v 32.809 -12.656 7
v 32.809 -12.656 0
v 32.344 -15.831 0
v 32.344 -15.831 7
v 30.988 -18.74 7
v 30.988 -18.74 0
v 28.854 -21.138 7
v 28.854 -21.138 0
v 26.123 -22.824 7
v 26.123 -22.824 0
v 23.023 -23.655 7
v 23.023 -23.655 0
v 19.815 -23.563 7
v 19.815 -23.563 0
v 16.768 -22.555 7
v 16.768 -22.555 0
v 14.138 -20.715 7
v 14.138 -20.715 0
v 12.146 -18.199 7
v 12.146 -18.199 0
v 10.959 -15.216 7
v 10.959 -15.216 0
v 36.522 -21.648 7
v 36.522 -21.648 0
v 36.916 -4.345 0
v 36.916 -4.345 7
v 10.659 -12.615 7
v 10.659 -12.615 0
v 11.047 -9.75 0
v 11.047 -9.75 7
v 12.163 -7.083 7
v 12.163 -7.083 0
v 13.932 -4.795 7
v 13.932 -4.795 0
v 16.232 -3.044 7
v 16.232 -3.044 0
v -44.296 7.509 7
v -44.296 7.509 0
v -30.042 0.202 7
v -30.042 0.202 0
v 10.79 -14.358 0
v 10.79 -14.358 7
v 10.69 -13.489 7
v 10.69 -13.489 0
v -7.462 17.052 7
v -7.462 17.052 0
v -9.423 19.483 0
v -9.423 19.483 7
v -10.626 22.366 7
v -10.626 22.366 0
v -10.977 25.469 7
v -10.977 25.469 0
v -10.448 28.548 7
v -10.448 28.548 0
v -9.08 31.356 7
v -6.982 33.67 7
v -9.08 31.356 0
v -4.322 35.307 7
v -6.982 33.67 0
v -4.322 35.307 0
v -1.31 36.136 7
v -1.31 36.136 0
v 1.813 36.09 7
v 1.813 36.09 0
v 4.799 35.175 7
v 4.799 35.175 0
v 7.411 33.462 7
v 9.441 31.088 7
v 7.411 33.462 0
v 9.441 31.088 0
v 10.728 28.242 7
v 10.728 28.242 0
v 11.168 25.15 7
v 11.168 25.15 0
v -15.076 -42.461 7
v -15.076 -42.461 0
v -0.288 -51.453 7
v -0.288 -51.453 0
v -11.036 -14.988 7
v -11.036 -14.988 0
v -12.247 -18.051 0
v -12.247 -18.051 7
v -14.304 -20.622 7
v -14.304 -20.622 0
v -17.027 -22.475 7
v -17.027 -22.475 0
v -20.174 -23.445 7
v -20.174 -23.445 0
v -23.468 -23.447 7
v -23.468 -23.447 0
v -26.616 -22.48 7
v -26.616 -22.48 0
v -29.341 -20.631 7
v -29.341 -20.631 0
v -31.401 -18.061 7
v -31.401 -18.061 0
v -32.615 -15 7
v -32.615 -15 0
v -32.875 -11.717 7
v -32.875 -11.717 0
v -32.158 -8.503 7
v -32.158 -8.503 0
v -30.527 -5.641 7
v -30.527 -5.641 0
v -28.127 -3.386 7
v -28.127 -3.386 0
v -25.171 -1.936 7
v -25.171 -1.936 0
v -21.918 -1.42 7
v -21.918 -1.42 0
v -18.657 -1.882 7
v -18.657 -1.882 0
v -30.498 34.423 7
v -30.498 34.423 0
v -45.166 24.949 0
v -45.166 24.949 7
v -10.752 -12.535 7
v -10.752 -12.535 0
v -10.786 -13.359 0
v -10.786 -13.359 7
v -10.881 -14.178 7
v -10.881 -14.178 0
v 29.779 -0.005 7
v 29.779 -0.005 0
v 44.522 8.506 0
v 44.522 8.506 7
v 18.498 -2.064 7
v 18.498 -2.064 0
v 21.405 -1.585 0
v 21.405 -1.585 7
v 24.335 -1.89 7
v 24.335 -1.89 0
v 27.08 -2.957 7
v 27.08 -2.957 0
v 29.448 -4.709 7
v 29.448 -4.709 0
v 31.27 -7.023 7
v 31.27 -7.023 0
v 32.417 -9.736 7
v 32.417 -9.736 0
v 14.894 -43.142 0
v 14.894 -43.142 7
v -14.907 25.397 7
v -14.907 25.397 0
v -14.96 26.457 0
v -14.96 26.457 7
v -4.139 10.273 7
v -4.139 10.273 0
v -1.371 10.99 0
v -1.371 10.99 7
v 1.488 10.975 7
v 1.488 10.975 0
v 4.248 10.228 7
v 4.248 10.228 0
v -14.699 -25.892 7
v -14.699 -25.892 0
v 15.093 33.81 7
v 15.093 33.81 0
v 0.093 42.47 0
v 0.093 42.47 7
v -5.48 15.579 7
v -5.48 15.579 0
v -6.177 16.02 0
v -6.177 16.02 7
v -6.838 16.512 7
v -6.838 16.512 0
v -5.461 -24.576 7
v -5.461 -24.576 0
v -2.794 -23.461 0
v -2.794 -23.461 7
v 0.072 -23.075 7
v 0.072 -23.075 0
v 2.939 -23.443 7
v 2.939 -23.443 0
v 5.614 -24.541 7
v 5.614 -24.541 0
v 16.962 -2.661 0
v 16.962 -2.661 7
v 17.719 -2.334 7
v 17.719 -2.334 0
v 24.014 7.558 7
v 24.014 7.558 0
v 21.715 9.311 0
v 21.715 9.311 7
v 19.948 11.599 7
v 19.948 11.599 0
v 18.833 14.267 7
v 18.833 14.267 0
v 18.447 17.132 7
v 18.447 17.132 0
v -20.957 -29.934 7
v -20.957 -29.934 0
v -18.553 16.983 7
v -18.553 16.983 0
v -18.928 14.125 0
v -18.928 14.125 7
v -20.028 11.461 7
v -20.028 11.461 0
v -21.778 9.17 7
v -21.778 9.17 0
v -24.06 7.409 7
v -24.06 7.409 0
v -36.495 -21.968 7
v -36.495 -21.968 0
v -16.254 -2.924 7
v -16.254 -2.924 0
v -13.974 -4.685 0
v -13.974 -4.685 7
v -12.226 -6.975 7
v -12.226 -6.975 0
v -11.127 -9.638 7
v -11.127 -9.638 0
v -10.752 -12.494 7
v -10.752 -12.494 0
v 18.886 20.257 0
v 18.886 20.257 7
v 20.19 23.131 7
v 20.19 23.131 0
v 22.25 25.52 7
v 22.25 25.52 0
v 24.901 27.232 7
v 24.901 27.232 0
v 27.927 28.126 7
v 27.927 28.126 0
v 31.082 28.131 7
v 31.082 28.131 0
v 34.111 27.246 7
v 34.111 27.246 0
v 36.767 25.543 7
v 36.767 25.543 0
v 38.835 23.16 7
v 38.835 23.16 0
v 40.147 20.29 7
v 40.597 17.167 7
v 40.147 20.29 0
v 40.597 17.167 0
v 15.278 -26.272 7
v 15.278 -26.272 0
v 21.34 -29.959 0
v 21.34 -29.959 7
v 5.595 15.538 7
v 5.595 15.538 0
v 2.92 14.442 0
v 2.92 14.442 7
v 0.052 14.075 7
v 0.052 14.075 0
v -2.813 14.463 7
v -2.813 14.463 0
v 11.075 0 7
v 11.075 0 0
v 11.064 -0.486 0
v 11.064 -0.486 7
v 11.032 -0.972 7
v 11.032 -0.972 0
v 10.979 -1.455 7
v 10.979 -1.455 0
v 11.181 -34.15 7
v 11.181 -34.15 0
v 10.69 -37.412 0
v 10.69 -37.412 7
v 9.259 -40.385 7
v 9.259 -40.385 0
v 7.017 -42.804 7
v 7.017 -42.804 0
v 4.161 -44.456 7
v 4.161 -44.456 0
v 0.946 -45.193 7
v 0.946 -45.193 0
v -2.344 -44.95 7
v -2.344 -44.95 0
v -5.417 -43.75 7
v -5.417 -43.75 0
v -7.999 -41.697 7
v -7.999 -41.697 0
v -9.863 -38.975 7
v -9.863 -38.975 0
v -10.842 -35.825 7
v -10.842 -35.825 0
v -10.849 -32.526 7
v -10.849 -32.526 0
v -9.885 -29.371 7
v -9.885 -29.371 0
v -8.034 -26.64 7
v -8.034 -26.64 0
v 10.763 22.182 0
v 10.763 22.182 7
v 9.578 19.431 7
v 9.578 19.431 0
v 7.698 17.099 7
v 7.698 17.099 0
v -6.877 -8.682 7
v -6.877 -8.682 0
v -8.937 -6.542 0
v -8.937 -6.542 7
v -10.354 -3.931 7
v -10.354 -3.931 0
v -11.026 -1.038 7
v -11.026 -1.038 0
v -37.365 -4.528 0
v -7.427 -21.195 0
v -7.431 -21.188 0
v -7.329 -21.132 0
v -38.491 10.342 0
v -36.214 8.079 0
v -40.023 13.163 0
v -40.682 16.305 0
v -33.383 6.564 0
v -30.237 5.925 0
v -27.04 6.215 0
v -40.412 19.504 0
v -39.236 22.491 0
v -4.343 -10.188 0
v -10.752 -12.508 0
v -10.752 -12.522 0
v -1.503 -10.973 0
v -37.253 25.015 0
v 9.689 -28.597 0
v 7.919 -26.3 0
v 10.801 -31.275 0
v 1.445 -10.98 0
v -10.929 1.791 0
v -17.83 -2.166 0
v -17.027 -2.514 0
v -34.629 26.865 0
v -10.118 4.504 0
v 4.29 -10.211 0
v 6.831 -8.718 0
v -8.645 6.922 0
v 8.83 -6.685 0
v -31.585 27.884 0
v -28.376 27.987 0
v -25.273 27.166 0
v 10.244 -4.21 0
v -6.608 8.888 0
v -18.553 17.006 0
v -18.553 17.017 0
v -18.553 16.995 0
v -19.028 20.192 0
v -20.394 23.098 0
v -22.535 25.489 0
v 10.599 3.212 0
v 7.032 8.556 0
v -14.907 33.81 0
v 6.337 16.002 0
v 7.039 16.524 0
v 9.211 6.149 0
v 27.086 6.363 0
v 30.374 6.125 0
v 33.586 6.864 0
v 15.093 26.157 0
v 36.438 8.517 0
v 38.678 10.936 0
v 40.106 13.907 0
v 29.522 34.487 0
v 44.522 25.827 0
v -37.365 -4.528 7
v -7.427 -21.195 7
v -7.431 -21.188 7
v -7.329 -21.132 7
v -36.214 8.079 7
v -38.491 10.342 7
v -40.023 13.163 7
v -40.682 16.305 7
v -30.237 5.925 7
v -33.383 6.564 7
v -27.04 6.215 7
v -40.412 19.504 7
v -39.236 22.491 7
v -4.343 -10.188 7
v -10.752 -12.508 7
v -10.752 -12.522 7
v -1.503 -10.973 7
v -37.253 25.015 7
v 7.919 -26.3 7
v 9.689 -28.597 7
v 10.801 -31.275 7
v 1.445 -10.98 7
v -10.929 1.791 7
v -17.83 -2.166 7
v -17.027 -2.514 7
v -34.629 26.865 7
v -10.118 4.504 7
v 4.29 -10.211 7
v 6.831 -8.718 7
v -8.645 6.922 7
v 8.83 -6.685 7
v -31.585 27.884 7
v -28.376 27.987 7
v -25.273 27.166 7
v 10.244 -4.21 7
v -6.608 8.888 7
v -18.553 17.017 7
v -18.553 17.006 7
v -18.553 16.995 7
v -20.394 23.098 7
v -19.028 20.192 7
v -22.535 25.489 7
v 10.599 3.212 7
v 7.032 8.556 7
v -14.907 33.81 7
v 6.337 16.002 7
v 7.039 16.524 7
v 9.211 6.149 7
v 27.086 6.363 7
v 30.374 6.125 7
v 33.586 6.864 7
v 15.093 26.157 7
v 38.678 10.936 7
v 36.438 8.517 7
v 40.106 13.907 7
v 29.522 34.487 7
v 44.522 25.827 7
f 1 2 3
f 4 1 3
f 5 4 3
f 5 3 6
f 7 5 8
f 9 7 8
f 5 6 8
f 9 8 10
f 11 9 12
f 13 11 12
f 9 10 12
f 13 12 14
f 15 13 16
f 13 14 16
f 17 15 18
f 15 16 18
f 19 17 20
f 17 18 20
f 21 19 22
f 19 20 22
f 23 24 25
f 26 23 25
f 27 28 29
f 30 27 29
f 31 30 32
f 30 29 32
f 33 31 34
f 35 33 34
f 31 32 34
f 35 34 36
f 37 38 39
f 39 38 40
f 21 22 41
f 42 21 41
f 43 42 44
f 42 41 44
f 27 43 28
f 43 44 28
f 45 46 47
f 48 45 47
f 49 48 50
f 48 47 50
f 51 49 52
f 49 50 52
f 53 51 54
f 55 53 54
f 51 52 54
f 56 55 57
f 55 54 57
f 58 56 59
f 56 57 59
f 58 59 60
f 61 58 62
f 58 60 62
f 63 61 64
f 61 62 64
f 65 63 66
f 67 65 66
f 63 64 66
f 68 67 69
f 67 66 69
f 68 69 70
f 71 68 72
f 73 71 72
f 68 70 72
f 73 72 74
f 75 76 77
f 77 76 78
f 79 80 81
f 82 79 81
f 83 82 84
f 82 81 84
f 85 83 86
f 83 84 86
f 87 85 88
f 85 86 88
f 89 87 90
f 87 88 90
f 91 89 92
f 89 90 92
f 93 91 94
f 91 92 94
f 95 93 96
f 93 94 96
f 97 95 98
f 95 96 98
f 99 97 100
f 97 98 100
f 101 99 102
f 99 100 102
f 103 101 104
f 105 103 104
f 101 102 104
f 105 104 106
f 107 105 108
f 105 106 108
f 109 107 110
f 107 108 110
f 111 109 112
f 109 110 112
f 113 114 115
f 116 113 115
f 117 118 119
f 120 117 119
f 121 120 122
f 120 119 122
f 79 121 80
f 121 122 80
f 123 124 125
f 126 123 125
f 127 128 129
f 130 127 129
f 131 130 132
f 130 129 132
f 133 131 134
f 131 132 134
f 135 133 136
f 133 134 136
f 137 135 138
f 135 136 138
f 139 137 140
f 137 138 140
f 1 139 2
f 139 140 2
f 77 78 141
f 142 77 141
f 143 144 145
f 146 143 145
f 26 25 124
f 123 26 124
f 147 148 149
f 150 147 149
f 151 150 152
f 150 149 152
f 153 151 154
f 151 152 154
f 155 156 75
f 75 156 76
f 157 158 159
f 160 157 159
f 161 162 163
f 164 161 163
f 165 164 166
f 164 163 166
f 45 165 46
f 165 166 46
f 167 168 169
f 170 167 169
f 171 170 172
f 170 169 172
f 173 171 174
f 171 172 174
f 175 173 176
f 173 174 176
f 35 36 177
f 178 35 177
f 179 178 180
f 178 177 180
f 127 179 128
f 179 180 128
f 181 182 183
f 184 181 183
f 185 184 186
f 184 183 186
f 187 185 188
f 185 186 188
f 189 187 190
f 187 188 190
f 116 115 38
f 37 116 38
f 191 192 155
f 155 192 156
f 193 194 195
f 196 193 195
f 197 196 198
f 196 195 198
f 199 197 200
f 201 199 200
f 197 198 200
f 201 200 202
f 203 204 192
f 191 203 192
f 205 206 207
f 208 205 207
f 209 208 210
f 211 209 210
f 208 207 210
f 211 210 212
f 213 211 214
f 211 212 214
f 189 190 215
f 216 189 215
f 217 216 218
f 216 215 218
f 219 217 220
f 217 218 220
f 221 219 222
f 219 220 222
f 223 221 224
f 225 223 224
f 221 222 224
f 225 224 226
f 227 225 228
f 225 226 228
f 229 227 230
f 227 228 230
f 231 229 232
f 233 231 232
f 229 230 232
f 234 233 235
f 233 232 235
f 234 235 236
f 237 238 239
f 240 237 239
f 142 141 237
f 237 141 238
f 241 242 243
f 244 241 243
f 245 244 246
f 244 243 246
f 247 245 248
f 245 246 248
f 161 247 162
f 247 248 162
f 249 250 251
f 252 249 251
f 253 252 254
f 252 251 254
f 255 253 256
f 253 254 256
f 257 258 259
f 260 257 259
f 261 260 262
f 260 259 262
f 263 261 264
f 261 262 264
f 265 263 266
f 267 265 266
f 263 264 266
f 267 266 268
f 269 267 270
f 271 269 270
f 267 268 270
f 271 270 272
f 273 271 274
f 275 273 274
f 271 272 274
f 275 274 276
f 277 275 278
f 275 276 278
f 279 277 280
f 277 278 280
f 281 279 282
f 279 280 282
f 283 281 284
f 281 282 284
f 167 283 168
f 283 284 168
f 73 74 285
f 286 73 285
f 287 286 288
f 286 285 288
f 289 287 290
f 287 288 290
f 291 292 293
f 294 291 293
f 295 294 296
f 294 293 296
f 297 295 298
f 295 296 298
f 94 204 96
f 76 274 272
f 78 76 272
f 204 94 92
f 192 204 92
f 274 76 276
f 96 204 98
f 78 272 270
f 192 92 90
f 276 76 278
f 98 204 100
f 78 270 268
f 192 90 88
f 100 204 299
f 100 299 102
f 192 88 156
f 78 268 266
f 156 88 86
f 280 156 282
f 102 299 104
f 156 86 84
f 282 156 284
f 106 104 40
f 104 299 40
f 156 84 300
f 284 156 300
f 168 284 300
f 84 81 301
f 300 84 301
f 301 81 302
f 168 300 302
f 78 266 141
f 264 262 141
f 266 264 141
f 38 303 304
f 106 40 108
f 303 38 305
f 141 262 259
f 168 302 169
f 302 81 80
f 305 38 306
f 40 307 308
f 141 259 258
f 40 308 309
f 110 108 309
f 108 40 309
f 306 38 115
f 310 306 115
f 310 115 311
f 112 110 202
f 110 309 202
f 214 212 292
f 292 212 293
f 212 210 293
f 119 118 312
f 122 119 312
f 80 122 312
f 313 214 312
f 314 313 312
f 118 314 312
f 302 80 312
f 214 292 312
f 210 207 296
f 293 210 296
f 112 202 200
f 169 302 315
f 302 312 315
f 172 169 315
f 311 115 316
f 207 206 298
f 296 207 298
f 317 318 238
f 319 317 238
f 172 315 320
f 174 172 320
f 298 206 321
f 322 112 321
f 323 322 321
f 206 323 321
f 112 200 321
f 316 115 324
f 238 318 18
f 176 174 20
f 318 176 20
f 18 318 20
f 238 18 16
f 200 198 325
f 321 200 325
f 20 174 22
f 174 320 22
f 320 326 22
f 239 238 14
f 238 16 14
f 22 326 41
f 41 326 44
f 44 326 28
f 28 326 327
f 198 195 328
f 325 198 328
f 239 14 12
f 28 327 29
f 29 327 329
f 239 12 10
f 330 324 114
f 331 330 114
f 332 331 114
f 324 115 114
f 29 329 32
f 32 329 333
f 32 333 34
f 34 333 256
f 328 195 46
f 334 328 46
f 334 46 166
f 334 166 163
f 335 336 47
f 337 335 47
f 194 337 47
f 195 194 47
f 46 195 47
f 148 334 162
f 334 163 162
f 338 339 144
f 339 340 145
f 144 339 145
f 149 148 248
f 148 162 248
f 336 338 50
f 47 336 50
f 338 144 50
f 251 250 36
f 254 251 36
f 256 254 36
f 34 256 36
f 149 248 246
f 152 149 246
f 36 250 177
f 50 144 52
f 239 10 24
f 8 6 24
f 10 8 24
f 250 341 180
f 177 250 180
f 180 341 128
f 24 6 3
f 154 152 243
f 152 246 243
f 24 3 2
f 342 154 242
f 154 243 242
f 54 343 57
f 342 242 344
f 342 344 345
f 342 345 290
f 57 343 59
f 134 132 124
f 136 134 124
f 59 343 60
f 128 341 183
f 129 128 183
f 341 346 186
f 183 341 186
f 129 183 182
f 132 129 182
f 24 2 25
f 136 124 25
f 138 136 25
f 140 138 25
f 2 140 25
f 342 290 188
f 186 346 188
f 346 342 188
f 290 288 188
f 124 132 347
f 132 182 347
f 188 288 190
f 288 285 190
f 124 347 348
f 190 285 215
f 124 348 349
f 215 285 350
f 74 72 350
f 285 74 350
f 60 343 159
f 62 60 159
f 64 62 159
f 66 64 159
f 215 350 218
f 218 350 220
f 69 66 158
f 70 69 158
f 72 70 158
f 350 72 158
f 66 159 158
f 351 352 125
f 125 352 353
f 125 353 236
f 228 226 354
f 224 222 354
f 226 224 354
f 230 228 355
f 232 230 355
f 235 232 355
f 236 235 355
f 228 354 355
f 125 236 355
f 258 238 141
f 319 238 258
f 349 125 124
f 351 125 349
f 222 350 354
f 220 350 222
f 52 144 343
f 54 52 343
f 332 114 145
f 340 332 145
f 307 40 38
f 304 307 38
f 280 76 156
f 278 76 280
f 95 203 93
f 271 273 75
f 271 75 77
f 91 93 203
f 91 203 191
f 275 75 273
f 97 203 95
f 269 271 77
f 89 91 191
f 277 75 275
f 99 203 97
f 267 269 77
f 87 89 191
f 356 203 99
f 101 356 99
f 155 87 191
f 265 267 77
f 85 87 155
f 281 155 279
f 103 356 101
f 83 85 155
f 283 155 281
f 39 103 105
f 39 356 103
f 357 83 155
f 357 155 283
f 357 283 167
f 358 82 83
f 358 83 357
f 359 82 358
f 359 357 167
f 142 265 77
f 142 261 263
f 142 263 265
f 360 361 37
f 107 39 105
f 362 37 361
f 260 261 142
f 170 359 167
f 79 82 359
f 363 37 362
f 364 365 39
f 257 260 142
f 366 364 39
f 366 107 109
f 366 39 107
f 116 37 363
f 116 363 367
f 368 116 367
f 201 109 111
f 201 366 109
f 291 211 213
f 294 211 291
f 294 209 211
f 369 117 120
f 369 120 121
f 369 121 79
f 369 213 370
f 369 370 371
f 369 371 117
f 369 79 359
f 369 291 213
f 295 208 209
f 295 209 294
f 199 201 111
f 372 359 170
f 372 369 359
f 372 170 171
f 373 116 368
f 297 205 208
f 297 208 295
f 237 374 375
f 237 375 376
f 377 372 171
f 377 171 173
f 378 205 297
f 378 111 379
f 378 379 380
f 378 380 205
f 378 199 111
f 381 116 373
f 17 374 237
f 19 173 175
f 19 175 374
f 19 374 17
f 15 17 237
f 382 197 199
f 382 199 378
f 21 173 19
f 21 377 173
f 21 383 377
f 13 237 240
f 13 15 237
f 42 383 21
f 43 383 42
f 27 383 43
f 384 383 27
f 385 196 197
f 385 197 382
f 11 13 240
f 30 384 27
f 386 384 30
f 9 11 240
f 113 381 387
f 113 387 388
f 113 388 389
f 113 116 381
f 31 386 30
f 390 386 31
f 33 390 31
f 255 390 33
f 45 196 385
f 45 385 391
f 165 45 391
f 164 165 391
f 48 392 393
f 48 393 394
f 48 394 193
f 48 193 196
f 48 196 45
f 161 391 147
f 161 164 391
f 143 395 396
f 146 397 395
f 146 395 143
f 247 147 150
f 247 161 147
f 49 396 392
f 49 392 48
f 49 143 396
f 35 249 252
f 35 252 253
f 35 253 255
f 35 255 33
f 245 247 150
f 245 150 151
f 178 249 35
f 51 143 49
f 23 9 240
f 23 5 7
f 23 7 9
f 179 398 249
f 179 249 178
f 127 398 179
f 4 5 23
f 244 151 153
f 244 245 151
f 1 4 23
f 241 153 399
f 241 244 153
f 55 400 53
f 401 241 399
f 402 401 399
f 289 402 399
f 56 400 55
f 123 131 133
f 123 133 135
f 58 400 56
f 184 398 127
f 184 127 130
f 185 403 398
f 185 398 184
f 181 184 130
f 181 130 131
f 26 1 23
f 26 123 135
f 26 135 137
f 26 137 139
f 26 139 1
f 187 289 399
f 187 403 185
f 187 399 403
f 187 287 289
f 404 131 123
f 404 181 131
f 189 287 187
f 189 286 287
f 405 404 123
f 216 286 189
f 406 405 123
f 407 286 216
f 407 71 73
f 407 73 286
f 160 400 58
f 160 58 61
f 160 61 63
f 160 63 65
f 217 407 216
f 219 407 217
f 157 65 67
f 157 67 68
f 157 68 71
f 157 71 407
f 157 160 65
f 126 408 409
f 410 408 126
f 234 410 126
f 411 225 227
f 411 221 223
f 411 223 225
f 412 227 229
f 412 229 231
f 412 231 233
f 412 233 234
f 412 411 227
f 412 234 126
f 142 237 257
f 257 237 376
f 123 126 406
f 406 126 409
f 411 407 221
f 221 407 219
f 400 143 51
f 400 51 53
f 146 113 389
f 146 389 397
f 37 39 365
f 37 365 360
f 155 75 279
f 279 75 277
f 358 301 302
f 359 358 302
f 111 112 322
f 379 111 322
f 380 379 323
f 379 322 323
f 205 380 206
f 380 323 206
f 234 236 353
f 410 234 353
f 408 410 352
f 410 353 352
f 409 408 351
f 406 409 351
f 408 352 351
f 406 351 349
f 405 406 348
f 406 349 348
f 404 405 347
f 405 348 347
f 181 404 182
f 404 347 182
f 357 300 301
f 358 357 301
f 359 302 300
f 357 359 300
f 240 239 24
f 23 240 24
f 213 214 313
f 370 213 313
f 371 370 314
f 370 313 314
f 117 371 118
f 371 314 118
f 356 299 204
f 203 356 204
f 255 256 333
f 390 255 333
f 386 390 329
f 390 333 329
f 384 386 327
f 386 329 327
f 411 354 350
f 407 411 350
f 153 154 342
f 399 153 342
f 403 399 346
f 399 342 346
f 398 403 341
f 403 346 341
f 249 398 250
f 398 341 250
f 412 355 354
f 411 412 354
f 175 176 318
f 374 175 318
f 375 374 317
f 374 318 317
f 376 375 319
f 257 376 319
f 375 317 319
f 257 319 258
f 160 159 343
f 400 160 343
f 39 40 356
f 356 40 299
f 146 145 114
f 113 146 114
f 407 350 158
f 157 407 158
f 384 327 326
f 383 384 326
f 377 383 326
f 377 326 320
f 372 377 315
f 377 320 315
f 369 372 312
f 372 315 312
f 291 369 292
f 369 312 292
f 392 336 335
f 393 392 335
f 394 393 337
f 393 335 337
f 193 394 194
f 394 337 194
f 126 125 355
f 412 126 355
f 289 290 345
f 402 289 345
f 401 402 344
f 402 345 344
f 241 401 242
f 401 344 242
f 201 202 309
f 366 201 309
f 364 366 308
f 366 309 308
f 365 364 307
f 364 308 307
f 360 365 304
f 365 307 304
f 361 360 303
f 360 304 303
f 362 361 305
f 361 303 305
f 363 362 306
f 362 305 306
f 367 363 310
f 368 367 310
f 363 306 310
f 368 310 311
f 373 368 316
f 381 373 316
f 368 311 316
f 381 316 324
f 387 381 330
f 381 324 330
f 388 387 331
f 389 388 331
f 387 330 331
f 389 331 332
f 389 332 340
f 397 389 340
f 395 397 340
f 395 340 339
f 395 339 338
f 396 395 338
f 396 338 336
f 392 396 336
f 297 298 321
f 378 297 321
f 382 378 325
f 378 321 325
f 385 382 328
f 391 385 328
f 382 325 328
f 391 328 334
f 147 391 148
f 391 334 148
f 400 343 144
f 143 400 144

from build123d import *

# Parameters (mm, degrees)
F1_DEPTH = 7


with BuildPart() as f1:
    # F0 (on Top) → F1 (new body)
    with BuildSketch(Plane.XY):
        with BuildLine():
            Line((-18.5526829578, 17.017490387), (-14.9068294969, 17.0288079719))
            Line((-14.9068294969, 17.0288079719), (-14.9068294969, 25.39699213))
            Line((-14.9068294969, 25.39699213), (-14.9597222584, 26.4567236773))
            Line((-14.9597222584, 26.4567236773), (-30.4980650394, 34.4226977911))
            Line((-30.4980650394, 34.4226977911), (-45.1659723783, 24.949085267))
            Line((-45.1659723783, 24.949085267), (-44.2955369363, 7.5094986291))
            Line((-44.2955369363, 7.5094986291), (-30.0415552646, 0.2019722978))
            Line((-30.0415552646, 0.2019722978), (-22.6974101401, 4.9453609505))
            Line((-22.6974101401, 4.9453609505), (-22.598117295, 4.8944569227))
            Line((-22.598117295, 4.8944569227), (-24.0603829878, 7.4091156347))
            ThreePointArc((-24.0603829878, 7.4091156347), (-39.2360043497, 22.4908111831), (-18.5526829578, 17.017490387))
        make_face()
        with BuildLine():
            Line((-14.0892868164, 9.0171370394), (-14.4490557214, 16.2252775697))
            Line((-14.4490557214, 16.2252775697), (-14.9068294969, 16.4895733822))
            Line((-14.9068294969, 16.4895733822), (-14.9068294969, 17.0288079719))
            Line((-14.9068294969, 17.0288079719), (-18.5526829578, 17.017490387))
            ThreePointArc((-18.5526829578, 17.017490387), (-18.5526429375, 17.0003007908), (-18.5526295974, 16.9831111532))
            ThreePointArc((-18.5526295974, 16.9831111532), (-20.0278149845, 11.4605044861), (-24.0603829878, 7.4091156347))
            Line((-24.0603829878, 7.4091156347), (-22.598117295, 4.8944569227))
            Line((-22.598117295, 4.8944569227), (-21.4130490309, 4.2869131679))
            Line((-21.4130490309, 4.2869131679), (-14.0892868164, 9.0171370394))
        make_face()
        with BuildLine():
            Line((7.5450461038, 12.1316617283), (5.5951009003, 15.538147707))
            ThreePointArc((5.5951009003, 15.538147707), (0.0521421404, 14.074903417), (-5.4798231028, 15.5791760698))
            Line((-5.4798231028, 15.5791760698), (-7.4549538962, 12.1872309982))
            Line((-7.4549538962, 12.1872309982), (-4.1387329274, 10.2726099291))
            ThreePointArc((-4.1387329274, 10.2726099291), (0.0589181779, 11.0748432787), (4.2477961597, 10.2279935855))
            Line((4.2477961597, 10.2279935855), (7.5450461038, 12.1316617283))
        make_face()
        with BuildLine():
            ThreePointArc((7.6983976037, 17.0989799026), (6.6930526008, 16.2561678079), (5.5951009003, 15.538147707))
            Line((5.5951009003, 15.538147707), (7.5450461038, 12.1316617283))
            Line((7.5450461038, 12.1316617283), (14.5216204926, 16.1595888298))
            Line((14.5216204926, 16.1595888298), (14.5216204926, 17.1201607879))
            Line((14.5216204926, 17.1201607879), (7.6983976037, 17.0989799026))
        make_face()
        with BuildLine():
            Line((-7.4549538962, 12.1872309982), (-5.4798231028, 15.5791760698))
            ThreePointArc((-5.4798231028, 15.5791760698), (-6.5120499472, 16.2601318233), (-7.4619270677, 17.0519186964))
            Line((-7.4619270677, 17.0519186964), (-14.4892258089, 17.0301043117))
            Line((-14.4892258089, 17.0301043117), (-14.4490557214, 16.2252775697))
            Line((-14.4490557214, 16.2252775697), (-7.4549538962, 12.1872309982))
        make_face()
        with BuildLine():
            Line((22.0619456845, 4.1530614915), (18.4983583082, -2.0637409464))
            ThreePointArc((18.4983583082, -2.0637409464), (28.3225469356, -3.7536865399), (32.808804195, -12.6556017326))
            ThreePointArc((32.808804195, -12.6556017326), (23.0230169106, -23.6553088003), (10.9589521726, -15.2164978445))
            Line((10.9589521726, -15.2164978445), (7.5625985652, -21.1415551413))
            Line((7.5625985652, -21.1415551413), (15.2877535418, -25.8390431462))
            Line((15.2877535418, -25.8390431462), (15.2778985596, -26.2723747345))
            Line((15.2778985596, -26.2723747345), (21.3402892473, -29.9587742467))
            Line((21.3402892473, -29.9587742467), (36.5220336844, -21.6479819311))
            Line((36.5220336844, -21.6479819311), (36.915548632, -4.344809417))
            Line((36.915548632, -4.344809417), (29.7789547231, -0.0052117798))
            Line((29.7789547231, -0.0052117798), (29.5216204926, -0.153783767))
            Line((29.5216204926, -0.153783767), (22.0619456845, 4.1530614915))
        make_face()
        with BuildLine():
            Line((16.2318737978, -3.0439220196), (14.28616406, 0.3551647489))
            Line((14.28616406, 0.3551647489), (10.978973026, -1.4552581538))
            ThreePointArc((10.978973026, -1.4552581538), (9.6167137365, -5.4931267881), (6.8306240676, -8.7176946407))
            Line((6.8306240676, -8.7176946407), (6.7423298318, -12.600064047))
            Line((6.7423298318, -12.600064047), (10.6588801919, -12.6145733699))
            ThreePointArc((10.6588801919, -12.6145733699), (12.1631528447, -7.0826081267), (16.2318737978, -3.0439220196))
        make_face()
        with BuildLine():
            Line((21.6541090723, 4.3885260694), (14.28616406, 0.3551647489))
            Line((14.28616406, 0.3551647489), (16.2318737978, -3.0439220196))
            ThreePointArc((16.2318737978, -3.0439220196), (17.3377122014, -2.4904652267), (18.4983583082, -2.0637409464))
            Line((18.4983583082, -2.0637409464), (22.0619456845, 4.1530614915))
            Line((22.0619456845, 4.1530614915), (21.6541090723, 4.3885260694))
        make_face()
        with BuildLine():
            Line((6.5520597579, -20.9663940482), (6.5619147401, -20.53306246))
            Line((6.5619147401, -20.53306246), (0.4995240524, -16.8466629478))
            Line((0.4995240524, -16.8466629478), (-7.3290866708, -21.1322019456))
            Line((-7.3290866708, -21.1322019456), (-7.4269476123, -21.1954077335))
            Line((-7.4269476123, -21.1954077335), (-5.4612375049, -24.5758399433))
            ThreePointArc((-5.4612375049, -24.5758399434), (0.0716298709, -23.0748888223), (5.6137091346, -24.5414607095))
            Line((5.6137091346, -24.5414607095), (7.3758596449, -21.4673276993))
            Line((7.3758596449, -21.4673276993), (6.5520597579, -20.9663940482))
        make_face()
        with BuildLine():
            Line((-6.6834253252, -12.5503267529), (-10.7520506951, -12.5352540501))
            ThreePointArc((-10.7520506951, -12.5352540501), (-10.8256622543, -13.7696665966), (-11.0364312406, -14.98817775))
            Line((-11.0364312406, -14.98817775), (-7.4311973822, -21.1880994032))
            Line((-7.4311973822, -21.1880994032), (-7.3290866708, -21.1322019456))
            Line((-7.3290866708, -21.1322019456), (-6.2886319172, -20.4601998012))
            Line((-6.2886319172, -20.4601998012), (-6.6834253252, -12.5503267529))
        make_face()
        with BuildLine():
            ThreePointArc((-11.0364312406, -14.98817775), (-31.4009702166, -18.061472297), (-18.6573497763, -1.8824820581))
            Line((-18.6573497763, -1.8824820581), (-22.017730434, 3.8963654789))
            Line((-22.017730434, 3.8963654789), (-28.7571941554, -0.4564754847))
            Line((-28.7571941554, -0.4564754847), (-30.0415552646, 0.2019722978))
            Line((-30.0415552646, 0.2019722978), (-37.3653174791, -4.5282515736))
            Line((-37.3653174791, -4.5282515736), (-36.4948820371, -21.9678382115))
            Line((-36.4948820371, -21.9678382115), (-20.9565392561, -29.9338123253))
            Line((-20.9565392561, -29.9338123253), (-14.6989299478, -25.8921883538))
            Line((-14.6989299478, -25.8921883538), (-14.6822203847, -25.1574552634))
            Line((-14.6822203847, -25.1574552634), (-7.4311973822, -21.1880994032))
            Line((-7.4311973822, -21.1880994032), (-11.0364312406, -14.98817775))
        make_face()
        with BuildLine():
            Line((-11.0262455027, -1.0380438881), (-14.2066150638, 0.5924222403))
            Line((-14.2066150638, 0.5924222403), (-16.2539810922, -2.9235743371))
            ThreePointArc((-16.2539810922, -2.9235743371), (-12.2255026968, -6.9745010197), (-10.7519746981, -12.4942256874))
            ThreePointArc((-10.7519746981, -12.4942256874), (-10.7519936974, -12.514739904), (-10.7520506951, -12.5352540501))
            Line((-10.7520506951, -12.5352540501), (-6.6834253252, -12.5503267529))
            Line((-6.6834253252, -12.5503267529), (-6.8765223734, -8.6815358692))
            ThreePointArc((-6.8765223734, -8.6815358692), (-9.7330887607, -5.2841847221), (-11.0262455027, -1.0380438881))
        make_face()
        with BuildLine():
            Line((-16.2539810922, -2.9235743371), (-14.2066150638, 0.5924222403))
            Line((-14.2066150638, 0.5924222403), (-21.4130490309, 4.2869131679))
            Line((-21.4130490309, 4.2869131679), (-22.017730434, 3.8963654789))
            Line((-22.017730434, 3.8963654789), (-18.6573497763, -1.8824820581))
            ThreePointArc((-18.6573497763, -1.8824820581), (-17.4247805902, -2.3317303228), (-16.2539810922, -2.9235743371))
        make_face()
        Polygon((-22.017730434, 3.8963654789), (-22.598117295, 4.8944569227), (-22.6974101401, 4.9453609505), (-30.0415552646, 0.2019722978), (-28.7571941554, -0.4564754847), align=None)
        Polygon((6.5619147401, -20.53306246), (6.7423298318, -12.600064047), (-6.6834253252, -12.5503267529), (-6.2886319172, -20.4601998012), (-7.3290866708, -21.1322019456), (0.4995240524, -16.8466629478), align=None)
        with BuildLine():
            Line((6.7423298318, -12.600064047), (6.8306240676, -8.7176946407))
            ThreePointArc((6.8306240676, -8.7176946407), (-0.0292151983, -11.0749614659), (-6.8765223734, -8.6815358692))
            Line((-6.8765223734, -8.6815358692), (-6.6834253252, -12.5503267529))
            Line((-6.6834253252, -12.5503267529), (6.7423298318, -12.600064047))
        make_face()
        with BuildLine():
            Line((14.28616406, 0.3551647489), (7.5450461038, 12.1316617283))
            Line((7.5450461038, 12.1316617283), (4.2477961597, 10.2279935855))
            ThreePointArc((4.2477961597, 10.2279935855), (9.2114050901, 6.1486292184), (11.075, 0))
            ThreePointArc((11.075, 0), (11.0509671808, -0.7292114703), (10.978973026, -1.4552581538))
            Line((10.978973026, -1.4552581538), (14.28616406, 0.3551647489))
        make_face()
        Polygon((14.5216204926, 16.1595888298), (7.5450461038, 12.1316617283), (14.28616406, 0.3551647489), (21.6541090723, 4.3885260694), (14.5216204926, 8.5064702708), align=None)
        with BuildLine():
            ThreePointArc((11.1681705031, 25.14982742), (10.2638026157, 20.7664648488), (7.6983976037, 17.0989799026))
            Line((7.6983976037, 17.0989799026), (14.5216204926, 17.1201607879))
            Line((14.5216204926, 17.1201607879), (14.5216204926, 25.8269783465))
            Line((14.5216204926, 25.8269783465), (15.0931705031, 26.1569628989))
            Line((15.0931705031, 26.1569628989), (15.0931705031, 33.8100814579))
            Line((15.0931705031, 33.8100814579), (0.0931705031, 42.4703354957))
            Line((0.0931705031, 42.4703354957), (-14.9068294969, 33.8100814579))
            Line((-14.9068294969, 33.8100814579), (-14.9068294969, 25.39699213))
            Line((-14.9068294969, 25.39699213), (-14.4892258089, 17.0301043117))
            Line((-14.4892258089, 17.0301043117), (-7.4619270677, 17.0519186964))
            ThreePointArc((-7.4619270677, 17.0519186964), (-4.3217428258, 35.3068036088), (11.1681705031, 25.14982742))
        make_face()
        with BuildLine():
            Line((15.0931705031, 26.1569628989), (15.0931705031, 17.1219350133))
            Line((15.0931705031, 17.1219350133), (18.4466738531, 17.1323450748))
            ThreePointArc((18.4466738531, 17.1323450748), (29.504430855, 28.2417109685), (40.5966204926, 17.1667243086))
            ThreePointArc((40.5966204926, 17.1667243086), (35.0740004854, 7.5840993334), (24.0139204627, 7.5583495563))
            Line((24.0139204627, 7.5583495563), (22.2890385659, 4.5492329418))
            Line((22.2890385659, 4.5492329418), (29.7789547231, -0.0052117798))
            Line((29.7789547231, -0.0052117798), (44.5216204926, 8.5064702708))
            Line((44.5216204926, 8.5064702708), (44.5216204926, 25.8269783465))
            Line((44.5216204926, 25.8269783465), (29.5216204926, 34.4872323843))
            Line((29.5216204926, 34.4872323843), (15.0931705031, 26.1569628989))
        make_face()
        Polygon((-14.2066150638, 0.5924222403), (-7.4549538962, 12.1872309982), (-14.4490557214, 16.2252775697), (-14.0892868164, 9.0171370394), (-21.4130490309, 4.2869131679), align=None)
        with BuildLine():
            Line((-4.1387329274, 10.2726099291), (-7.4549538962, 12.1872309982))
            Line((-7.4549538962, 12.1872309982), (-14.2066150638, 0.5924222403))
            Line((-14.2066150638, 0.5924222403), (-11.0262455027, -1.0380438881))
            ThreePointArc((-11.0262455027, -1.0380438881), (-9.4592211698, 5.7601006815), (-4.1387329274, 10.2726099291))
        make_face()
        Polygon((-22.017730434, 3.8963654789), (-21.4130490309, 4.2869131679), (-22.598117295, 4.8944569227), align=None)
        Polygon((-14.4490557214, 16.2252775697), (-14.4892258089, 17.0301043117), (-14.9068294969, 17.0288079719), (-14.9068294969, 16.4895733822), align=None)
        Polygon((-14.9068294969, 17.0288079719), (-14.4892258089, 17.0301043117), (-14.9068294969, 25.39699213), align=None)
        Polygon((14.5216204926, 25.8269783465), (14.5216204926, 17.1201607879), (15.0931705031, 17.1219350133), (15.0931705031, 26.1569628989), align=None)
        Polygon((15.0931705031, 17.1219350133), (14.5216204926, 17.1201607879), (14.5216204926, 16.1595888298), (15.0931705031, 16.4895733822), align=None)
        with BuildLine():
            Line((15.0931705031, 16.4895733822), (14.5216204926, 16.1595888298))
            Line((14.5216204926, 16.1595888298), (14.5216204926, 8.5064702708))
            Line((14.5216204926, 8.5064702708), (21.6541090723, 4.3885260694))
            Line((21.6541090723, 4.3885260694), (22.1273191426, 4.6475707814))
            Line((22.1273191426, 4.6475707814), (22.2890385659, 4.5492329418))
            Line((22.2890385659, 4.5492329418), (24.0139204627, 7.5583495563))
            ThreePointArc((24.0139204627, 7.5583495563), (19.9476249742, 11.599477699), (18.4466738531, 17.1323450748))
            Line((18.4466738531, 17.1323450748), (15.0931705031, 17.1219350133))
            Line((15.0931705031, 17.1219350133), (15.0931705031, 16.4895733822))
        make_face()
        Polygon((22.2890385659, 4.5492329418), (22.0619456845, 4.1530614915), (29.5216204926, -0.153783767), (29.7789547231, -0.0052117798), align=None)
        Polygon((22.1273191426, 4.6475707814), (21.6541090723, 4.3885260694), (22.0619456845, 4.1530614915), (22.2890385659, 4.5492329418), align=None)
        Polygon((-7.4269476123, -21.1954077335), (-7.4311973822, -21.1880994032), (-14.6822203847, -25.1574552634), (-14.6989299478, -25.8921883538), align=None)
        with BuildLine():
            Line((15.2778985596, -26.2723747345), (7.3758596449, -21.4673276993))
            Line((7.3758596449, -21.4673276993), (5.6137091346, -24.5414607095))
            ThreePointArc((5.6137091346, -24.5414607095), (9.6886340799, -28.597455469), (11.1810091047, -34.1498354618))
            ThreePointArc((11.1810091047, -34.1498354618), (-5.4165975624, -43.7496500747), (-5.4612375049, -24.5758399434))
            Line((-5.4612375049, -24.5758399433), (-7.4269476123, -21.1954077335))
            Line((-7.4269476123, -21.1954077335), (-14.6989299478, -25.8921883538))
            Line((-14.6989299478, -25.8921883538), (-15.0757353323, -42.4606277774))
            Line((-15.0757353323, -42.4606277774), (-0.2875058429, -51.4530079759))
            Line((-0.2875058429, -51.4530079759), (14.8942385941, -43.1422156603))
            Line((14.8942385941, -43.1422156603), (15.2778985596, -26.2723747345))
        make_face()
        Polygon((15.2877535418, -25.8390431462), (7.5625985652, -21.1415551413), (7.3758596449, -21.4673276993), (15.2778985596, -26.2723747345), align=None)
        Polygon((7.5625985652, -21.1415551413), (6.5619147401, -20.53306246), (6.5520597579, -20.9663940482), (7.3758596449, -21.4673276993), align=None)
        with BuildLine():
            ThreePointArc((10.9589521726, -15.2164978445), (10.7317279894, -13.9244374851), (10.6588801919, -12.6145733699))
            Line((10.6588801919, -12.6145733699), (6.7423298318, -12.600064047))
            Line((6.7423298318, -12.600064047), (6.5619147401, -20.53306246))
            Line((6.5619147401, -20.53306246), (7.5625985652, -21.1415551413))
            Line((7.5625985652, -21.1415551413), (10.9589521726, -15.2164978445))
        make_face()
    extrude(amount=F1_DEPTH)


solid = f1.part
